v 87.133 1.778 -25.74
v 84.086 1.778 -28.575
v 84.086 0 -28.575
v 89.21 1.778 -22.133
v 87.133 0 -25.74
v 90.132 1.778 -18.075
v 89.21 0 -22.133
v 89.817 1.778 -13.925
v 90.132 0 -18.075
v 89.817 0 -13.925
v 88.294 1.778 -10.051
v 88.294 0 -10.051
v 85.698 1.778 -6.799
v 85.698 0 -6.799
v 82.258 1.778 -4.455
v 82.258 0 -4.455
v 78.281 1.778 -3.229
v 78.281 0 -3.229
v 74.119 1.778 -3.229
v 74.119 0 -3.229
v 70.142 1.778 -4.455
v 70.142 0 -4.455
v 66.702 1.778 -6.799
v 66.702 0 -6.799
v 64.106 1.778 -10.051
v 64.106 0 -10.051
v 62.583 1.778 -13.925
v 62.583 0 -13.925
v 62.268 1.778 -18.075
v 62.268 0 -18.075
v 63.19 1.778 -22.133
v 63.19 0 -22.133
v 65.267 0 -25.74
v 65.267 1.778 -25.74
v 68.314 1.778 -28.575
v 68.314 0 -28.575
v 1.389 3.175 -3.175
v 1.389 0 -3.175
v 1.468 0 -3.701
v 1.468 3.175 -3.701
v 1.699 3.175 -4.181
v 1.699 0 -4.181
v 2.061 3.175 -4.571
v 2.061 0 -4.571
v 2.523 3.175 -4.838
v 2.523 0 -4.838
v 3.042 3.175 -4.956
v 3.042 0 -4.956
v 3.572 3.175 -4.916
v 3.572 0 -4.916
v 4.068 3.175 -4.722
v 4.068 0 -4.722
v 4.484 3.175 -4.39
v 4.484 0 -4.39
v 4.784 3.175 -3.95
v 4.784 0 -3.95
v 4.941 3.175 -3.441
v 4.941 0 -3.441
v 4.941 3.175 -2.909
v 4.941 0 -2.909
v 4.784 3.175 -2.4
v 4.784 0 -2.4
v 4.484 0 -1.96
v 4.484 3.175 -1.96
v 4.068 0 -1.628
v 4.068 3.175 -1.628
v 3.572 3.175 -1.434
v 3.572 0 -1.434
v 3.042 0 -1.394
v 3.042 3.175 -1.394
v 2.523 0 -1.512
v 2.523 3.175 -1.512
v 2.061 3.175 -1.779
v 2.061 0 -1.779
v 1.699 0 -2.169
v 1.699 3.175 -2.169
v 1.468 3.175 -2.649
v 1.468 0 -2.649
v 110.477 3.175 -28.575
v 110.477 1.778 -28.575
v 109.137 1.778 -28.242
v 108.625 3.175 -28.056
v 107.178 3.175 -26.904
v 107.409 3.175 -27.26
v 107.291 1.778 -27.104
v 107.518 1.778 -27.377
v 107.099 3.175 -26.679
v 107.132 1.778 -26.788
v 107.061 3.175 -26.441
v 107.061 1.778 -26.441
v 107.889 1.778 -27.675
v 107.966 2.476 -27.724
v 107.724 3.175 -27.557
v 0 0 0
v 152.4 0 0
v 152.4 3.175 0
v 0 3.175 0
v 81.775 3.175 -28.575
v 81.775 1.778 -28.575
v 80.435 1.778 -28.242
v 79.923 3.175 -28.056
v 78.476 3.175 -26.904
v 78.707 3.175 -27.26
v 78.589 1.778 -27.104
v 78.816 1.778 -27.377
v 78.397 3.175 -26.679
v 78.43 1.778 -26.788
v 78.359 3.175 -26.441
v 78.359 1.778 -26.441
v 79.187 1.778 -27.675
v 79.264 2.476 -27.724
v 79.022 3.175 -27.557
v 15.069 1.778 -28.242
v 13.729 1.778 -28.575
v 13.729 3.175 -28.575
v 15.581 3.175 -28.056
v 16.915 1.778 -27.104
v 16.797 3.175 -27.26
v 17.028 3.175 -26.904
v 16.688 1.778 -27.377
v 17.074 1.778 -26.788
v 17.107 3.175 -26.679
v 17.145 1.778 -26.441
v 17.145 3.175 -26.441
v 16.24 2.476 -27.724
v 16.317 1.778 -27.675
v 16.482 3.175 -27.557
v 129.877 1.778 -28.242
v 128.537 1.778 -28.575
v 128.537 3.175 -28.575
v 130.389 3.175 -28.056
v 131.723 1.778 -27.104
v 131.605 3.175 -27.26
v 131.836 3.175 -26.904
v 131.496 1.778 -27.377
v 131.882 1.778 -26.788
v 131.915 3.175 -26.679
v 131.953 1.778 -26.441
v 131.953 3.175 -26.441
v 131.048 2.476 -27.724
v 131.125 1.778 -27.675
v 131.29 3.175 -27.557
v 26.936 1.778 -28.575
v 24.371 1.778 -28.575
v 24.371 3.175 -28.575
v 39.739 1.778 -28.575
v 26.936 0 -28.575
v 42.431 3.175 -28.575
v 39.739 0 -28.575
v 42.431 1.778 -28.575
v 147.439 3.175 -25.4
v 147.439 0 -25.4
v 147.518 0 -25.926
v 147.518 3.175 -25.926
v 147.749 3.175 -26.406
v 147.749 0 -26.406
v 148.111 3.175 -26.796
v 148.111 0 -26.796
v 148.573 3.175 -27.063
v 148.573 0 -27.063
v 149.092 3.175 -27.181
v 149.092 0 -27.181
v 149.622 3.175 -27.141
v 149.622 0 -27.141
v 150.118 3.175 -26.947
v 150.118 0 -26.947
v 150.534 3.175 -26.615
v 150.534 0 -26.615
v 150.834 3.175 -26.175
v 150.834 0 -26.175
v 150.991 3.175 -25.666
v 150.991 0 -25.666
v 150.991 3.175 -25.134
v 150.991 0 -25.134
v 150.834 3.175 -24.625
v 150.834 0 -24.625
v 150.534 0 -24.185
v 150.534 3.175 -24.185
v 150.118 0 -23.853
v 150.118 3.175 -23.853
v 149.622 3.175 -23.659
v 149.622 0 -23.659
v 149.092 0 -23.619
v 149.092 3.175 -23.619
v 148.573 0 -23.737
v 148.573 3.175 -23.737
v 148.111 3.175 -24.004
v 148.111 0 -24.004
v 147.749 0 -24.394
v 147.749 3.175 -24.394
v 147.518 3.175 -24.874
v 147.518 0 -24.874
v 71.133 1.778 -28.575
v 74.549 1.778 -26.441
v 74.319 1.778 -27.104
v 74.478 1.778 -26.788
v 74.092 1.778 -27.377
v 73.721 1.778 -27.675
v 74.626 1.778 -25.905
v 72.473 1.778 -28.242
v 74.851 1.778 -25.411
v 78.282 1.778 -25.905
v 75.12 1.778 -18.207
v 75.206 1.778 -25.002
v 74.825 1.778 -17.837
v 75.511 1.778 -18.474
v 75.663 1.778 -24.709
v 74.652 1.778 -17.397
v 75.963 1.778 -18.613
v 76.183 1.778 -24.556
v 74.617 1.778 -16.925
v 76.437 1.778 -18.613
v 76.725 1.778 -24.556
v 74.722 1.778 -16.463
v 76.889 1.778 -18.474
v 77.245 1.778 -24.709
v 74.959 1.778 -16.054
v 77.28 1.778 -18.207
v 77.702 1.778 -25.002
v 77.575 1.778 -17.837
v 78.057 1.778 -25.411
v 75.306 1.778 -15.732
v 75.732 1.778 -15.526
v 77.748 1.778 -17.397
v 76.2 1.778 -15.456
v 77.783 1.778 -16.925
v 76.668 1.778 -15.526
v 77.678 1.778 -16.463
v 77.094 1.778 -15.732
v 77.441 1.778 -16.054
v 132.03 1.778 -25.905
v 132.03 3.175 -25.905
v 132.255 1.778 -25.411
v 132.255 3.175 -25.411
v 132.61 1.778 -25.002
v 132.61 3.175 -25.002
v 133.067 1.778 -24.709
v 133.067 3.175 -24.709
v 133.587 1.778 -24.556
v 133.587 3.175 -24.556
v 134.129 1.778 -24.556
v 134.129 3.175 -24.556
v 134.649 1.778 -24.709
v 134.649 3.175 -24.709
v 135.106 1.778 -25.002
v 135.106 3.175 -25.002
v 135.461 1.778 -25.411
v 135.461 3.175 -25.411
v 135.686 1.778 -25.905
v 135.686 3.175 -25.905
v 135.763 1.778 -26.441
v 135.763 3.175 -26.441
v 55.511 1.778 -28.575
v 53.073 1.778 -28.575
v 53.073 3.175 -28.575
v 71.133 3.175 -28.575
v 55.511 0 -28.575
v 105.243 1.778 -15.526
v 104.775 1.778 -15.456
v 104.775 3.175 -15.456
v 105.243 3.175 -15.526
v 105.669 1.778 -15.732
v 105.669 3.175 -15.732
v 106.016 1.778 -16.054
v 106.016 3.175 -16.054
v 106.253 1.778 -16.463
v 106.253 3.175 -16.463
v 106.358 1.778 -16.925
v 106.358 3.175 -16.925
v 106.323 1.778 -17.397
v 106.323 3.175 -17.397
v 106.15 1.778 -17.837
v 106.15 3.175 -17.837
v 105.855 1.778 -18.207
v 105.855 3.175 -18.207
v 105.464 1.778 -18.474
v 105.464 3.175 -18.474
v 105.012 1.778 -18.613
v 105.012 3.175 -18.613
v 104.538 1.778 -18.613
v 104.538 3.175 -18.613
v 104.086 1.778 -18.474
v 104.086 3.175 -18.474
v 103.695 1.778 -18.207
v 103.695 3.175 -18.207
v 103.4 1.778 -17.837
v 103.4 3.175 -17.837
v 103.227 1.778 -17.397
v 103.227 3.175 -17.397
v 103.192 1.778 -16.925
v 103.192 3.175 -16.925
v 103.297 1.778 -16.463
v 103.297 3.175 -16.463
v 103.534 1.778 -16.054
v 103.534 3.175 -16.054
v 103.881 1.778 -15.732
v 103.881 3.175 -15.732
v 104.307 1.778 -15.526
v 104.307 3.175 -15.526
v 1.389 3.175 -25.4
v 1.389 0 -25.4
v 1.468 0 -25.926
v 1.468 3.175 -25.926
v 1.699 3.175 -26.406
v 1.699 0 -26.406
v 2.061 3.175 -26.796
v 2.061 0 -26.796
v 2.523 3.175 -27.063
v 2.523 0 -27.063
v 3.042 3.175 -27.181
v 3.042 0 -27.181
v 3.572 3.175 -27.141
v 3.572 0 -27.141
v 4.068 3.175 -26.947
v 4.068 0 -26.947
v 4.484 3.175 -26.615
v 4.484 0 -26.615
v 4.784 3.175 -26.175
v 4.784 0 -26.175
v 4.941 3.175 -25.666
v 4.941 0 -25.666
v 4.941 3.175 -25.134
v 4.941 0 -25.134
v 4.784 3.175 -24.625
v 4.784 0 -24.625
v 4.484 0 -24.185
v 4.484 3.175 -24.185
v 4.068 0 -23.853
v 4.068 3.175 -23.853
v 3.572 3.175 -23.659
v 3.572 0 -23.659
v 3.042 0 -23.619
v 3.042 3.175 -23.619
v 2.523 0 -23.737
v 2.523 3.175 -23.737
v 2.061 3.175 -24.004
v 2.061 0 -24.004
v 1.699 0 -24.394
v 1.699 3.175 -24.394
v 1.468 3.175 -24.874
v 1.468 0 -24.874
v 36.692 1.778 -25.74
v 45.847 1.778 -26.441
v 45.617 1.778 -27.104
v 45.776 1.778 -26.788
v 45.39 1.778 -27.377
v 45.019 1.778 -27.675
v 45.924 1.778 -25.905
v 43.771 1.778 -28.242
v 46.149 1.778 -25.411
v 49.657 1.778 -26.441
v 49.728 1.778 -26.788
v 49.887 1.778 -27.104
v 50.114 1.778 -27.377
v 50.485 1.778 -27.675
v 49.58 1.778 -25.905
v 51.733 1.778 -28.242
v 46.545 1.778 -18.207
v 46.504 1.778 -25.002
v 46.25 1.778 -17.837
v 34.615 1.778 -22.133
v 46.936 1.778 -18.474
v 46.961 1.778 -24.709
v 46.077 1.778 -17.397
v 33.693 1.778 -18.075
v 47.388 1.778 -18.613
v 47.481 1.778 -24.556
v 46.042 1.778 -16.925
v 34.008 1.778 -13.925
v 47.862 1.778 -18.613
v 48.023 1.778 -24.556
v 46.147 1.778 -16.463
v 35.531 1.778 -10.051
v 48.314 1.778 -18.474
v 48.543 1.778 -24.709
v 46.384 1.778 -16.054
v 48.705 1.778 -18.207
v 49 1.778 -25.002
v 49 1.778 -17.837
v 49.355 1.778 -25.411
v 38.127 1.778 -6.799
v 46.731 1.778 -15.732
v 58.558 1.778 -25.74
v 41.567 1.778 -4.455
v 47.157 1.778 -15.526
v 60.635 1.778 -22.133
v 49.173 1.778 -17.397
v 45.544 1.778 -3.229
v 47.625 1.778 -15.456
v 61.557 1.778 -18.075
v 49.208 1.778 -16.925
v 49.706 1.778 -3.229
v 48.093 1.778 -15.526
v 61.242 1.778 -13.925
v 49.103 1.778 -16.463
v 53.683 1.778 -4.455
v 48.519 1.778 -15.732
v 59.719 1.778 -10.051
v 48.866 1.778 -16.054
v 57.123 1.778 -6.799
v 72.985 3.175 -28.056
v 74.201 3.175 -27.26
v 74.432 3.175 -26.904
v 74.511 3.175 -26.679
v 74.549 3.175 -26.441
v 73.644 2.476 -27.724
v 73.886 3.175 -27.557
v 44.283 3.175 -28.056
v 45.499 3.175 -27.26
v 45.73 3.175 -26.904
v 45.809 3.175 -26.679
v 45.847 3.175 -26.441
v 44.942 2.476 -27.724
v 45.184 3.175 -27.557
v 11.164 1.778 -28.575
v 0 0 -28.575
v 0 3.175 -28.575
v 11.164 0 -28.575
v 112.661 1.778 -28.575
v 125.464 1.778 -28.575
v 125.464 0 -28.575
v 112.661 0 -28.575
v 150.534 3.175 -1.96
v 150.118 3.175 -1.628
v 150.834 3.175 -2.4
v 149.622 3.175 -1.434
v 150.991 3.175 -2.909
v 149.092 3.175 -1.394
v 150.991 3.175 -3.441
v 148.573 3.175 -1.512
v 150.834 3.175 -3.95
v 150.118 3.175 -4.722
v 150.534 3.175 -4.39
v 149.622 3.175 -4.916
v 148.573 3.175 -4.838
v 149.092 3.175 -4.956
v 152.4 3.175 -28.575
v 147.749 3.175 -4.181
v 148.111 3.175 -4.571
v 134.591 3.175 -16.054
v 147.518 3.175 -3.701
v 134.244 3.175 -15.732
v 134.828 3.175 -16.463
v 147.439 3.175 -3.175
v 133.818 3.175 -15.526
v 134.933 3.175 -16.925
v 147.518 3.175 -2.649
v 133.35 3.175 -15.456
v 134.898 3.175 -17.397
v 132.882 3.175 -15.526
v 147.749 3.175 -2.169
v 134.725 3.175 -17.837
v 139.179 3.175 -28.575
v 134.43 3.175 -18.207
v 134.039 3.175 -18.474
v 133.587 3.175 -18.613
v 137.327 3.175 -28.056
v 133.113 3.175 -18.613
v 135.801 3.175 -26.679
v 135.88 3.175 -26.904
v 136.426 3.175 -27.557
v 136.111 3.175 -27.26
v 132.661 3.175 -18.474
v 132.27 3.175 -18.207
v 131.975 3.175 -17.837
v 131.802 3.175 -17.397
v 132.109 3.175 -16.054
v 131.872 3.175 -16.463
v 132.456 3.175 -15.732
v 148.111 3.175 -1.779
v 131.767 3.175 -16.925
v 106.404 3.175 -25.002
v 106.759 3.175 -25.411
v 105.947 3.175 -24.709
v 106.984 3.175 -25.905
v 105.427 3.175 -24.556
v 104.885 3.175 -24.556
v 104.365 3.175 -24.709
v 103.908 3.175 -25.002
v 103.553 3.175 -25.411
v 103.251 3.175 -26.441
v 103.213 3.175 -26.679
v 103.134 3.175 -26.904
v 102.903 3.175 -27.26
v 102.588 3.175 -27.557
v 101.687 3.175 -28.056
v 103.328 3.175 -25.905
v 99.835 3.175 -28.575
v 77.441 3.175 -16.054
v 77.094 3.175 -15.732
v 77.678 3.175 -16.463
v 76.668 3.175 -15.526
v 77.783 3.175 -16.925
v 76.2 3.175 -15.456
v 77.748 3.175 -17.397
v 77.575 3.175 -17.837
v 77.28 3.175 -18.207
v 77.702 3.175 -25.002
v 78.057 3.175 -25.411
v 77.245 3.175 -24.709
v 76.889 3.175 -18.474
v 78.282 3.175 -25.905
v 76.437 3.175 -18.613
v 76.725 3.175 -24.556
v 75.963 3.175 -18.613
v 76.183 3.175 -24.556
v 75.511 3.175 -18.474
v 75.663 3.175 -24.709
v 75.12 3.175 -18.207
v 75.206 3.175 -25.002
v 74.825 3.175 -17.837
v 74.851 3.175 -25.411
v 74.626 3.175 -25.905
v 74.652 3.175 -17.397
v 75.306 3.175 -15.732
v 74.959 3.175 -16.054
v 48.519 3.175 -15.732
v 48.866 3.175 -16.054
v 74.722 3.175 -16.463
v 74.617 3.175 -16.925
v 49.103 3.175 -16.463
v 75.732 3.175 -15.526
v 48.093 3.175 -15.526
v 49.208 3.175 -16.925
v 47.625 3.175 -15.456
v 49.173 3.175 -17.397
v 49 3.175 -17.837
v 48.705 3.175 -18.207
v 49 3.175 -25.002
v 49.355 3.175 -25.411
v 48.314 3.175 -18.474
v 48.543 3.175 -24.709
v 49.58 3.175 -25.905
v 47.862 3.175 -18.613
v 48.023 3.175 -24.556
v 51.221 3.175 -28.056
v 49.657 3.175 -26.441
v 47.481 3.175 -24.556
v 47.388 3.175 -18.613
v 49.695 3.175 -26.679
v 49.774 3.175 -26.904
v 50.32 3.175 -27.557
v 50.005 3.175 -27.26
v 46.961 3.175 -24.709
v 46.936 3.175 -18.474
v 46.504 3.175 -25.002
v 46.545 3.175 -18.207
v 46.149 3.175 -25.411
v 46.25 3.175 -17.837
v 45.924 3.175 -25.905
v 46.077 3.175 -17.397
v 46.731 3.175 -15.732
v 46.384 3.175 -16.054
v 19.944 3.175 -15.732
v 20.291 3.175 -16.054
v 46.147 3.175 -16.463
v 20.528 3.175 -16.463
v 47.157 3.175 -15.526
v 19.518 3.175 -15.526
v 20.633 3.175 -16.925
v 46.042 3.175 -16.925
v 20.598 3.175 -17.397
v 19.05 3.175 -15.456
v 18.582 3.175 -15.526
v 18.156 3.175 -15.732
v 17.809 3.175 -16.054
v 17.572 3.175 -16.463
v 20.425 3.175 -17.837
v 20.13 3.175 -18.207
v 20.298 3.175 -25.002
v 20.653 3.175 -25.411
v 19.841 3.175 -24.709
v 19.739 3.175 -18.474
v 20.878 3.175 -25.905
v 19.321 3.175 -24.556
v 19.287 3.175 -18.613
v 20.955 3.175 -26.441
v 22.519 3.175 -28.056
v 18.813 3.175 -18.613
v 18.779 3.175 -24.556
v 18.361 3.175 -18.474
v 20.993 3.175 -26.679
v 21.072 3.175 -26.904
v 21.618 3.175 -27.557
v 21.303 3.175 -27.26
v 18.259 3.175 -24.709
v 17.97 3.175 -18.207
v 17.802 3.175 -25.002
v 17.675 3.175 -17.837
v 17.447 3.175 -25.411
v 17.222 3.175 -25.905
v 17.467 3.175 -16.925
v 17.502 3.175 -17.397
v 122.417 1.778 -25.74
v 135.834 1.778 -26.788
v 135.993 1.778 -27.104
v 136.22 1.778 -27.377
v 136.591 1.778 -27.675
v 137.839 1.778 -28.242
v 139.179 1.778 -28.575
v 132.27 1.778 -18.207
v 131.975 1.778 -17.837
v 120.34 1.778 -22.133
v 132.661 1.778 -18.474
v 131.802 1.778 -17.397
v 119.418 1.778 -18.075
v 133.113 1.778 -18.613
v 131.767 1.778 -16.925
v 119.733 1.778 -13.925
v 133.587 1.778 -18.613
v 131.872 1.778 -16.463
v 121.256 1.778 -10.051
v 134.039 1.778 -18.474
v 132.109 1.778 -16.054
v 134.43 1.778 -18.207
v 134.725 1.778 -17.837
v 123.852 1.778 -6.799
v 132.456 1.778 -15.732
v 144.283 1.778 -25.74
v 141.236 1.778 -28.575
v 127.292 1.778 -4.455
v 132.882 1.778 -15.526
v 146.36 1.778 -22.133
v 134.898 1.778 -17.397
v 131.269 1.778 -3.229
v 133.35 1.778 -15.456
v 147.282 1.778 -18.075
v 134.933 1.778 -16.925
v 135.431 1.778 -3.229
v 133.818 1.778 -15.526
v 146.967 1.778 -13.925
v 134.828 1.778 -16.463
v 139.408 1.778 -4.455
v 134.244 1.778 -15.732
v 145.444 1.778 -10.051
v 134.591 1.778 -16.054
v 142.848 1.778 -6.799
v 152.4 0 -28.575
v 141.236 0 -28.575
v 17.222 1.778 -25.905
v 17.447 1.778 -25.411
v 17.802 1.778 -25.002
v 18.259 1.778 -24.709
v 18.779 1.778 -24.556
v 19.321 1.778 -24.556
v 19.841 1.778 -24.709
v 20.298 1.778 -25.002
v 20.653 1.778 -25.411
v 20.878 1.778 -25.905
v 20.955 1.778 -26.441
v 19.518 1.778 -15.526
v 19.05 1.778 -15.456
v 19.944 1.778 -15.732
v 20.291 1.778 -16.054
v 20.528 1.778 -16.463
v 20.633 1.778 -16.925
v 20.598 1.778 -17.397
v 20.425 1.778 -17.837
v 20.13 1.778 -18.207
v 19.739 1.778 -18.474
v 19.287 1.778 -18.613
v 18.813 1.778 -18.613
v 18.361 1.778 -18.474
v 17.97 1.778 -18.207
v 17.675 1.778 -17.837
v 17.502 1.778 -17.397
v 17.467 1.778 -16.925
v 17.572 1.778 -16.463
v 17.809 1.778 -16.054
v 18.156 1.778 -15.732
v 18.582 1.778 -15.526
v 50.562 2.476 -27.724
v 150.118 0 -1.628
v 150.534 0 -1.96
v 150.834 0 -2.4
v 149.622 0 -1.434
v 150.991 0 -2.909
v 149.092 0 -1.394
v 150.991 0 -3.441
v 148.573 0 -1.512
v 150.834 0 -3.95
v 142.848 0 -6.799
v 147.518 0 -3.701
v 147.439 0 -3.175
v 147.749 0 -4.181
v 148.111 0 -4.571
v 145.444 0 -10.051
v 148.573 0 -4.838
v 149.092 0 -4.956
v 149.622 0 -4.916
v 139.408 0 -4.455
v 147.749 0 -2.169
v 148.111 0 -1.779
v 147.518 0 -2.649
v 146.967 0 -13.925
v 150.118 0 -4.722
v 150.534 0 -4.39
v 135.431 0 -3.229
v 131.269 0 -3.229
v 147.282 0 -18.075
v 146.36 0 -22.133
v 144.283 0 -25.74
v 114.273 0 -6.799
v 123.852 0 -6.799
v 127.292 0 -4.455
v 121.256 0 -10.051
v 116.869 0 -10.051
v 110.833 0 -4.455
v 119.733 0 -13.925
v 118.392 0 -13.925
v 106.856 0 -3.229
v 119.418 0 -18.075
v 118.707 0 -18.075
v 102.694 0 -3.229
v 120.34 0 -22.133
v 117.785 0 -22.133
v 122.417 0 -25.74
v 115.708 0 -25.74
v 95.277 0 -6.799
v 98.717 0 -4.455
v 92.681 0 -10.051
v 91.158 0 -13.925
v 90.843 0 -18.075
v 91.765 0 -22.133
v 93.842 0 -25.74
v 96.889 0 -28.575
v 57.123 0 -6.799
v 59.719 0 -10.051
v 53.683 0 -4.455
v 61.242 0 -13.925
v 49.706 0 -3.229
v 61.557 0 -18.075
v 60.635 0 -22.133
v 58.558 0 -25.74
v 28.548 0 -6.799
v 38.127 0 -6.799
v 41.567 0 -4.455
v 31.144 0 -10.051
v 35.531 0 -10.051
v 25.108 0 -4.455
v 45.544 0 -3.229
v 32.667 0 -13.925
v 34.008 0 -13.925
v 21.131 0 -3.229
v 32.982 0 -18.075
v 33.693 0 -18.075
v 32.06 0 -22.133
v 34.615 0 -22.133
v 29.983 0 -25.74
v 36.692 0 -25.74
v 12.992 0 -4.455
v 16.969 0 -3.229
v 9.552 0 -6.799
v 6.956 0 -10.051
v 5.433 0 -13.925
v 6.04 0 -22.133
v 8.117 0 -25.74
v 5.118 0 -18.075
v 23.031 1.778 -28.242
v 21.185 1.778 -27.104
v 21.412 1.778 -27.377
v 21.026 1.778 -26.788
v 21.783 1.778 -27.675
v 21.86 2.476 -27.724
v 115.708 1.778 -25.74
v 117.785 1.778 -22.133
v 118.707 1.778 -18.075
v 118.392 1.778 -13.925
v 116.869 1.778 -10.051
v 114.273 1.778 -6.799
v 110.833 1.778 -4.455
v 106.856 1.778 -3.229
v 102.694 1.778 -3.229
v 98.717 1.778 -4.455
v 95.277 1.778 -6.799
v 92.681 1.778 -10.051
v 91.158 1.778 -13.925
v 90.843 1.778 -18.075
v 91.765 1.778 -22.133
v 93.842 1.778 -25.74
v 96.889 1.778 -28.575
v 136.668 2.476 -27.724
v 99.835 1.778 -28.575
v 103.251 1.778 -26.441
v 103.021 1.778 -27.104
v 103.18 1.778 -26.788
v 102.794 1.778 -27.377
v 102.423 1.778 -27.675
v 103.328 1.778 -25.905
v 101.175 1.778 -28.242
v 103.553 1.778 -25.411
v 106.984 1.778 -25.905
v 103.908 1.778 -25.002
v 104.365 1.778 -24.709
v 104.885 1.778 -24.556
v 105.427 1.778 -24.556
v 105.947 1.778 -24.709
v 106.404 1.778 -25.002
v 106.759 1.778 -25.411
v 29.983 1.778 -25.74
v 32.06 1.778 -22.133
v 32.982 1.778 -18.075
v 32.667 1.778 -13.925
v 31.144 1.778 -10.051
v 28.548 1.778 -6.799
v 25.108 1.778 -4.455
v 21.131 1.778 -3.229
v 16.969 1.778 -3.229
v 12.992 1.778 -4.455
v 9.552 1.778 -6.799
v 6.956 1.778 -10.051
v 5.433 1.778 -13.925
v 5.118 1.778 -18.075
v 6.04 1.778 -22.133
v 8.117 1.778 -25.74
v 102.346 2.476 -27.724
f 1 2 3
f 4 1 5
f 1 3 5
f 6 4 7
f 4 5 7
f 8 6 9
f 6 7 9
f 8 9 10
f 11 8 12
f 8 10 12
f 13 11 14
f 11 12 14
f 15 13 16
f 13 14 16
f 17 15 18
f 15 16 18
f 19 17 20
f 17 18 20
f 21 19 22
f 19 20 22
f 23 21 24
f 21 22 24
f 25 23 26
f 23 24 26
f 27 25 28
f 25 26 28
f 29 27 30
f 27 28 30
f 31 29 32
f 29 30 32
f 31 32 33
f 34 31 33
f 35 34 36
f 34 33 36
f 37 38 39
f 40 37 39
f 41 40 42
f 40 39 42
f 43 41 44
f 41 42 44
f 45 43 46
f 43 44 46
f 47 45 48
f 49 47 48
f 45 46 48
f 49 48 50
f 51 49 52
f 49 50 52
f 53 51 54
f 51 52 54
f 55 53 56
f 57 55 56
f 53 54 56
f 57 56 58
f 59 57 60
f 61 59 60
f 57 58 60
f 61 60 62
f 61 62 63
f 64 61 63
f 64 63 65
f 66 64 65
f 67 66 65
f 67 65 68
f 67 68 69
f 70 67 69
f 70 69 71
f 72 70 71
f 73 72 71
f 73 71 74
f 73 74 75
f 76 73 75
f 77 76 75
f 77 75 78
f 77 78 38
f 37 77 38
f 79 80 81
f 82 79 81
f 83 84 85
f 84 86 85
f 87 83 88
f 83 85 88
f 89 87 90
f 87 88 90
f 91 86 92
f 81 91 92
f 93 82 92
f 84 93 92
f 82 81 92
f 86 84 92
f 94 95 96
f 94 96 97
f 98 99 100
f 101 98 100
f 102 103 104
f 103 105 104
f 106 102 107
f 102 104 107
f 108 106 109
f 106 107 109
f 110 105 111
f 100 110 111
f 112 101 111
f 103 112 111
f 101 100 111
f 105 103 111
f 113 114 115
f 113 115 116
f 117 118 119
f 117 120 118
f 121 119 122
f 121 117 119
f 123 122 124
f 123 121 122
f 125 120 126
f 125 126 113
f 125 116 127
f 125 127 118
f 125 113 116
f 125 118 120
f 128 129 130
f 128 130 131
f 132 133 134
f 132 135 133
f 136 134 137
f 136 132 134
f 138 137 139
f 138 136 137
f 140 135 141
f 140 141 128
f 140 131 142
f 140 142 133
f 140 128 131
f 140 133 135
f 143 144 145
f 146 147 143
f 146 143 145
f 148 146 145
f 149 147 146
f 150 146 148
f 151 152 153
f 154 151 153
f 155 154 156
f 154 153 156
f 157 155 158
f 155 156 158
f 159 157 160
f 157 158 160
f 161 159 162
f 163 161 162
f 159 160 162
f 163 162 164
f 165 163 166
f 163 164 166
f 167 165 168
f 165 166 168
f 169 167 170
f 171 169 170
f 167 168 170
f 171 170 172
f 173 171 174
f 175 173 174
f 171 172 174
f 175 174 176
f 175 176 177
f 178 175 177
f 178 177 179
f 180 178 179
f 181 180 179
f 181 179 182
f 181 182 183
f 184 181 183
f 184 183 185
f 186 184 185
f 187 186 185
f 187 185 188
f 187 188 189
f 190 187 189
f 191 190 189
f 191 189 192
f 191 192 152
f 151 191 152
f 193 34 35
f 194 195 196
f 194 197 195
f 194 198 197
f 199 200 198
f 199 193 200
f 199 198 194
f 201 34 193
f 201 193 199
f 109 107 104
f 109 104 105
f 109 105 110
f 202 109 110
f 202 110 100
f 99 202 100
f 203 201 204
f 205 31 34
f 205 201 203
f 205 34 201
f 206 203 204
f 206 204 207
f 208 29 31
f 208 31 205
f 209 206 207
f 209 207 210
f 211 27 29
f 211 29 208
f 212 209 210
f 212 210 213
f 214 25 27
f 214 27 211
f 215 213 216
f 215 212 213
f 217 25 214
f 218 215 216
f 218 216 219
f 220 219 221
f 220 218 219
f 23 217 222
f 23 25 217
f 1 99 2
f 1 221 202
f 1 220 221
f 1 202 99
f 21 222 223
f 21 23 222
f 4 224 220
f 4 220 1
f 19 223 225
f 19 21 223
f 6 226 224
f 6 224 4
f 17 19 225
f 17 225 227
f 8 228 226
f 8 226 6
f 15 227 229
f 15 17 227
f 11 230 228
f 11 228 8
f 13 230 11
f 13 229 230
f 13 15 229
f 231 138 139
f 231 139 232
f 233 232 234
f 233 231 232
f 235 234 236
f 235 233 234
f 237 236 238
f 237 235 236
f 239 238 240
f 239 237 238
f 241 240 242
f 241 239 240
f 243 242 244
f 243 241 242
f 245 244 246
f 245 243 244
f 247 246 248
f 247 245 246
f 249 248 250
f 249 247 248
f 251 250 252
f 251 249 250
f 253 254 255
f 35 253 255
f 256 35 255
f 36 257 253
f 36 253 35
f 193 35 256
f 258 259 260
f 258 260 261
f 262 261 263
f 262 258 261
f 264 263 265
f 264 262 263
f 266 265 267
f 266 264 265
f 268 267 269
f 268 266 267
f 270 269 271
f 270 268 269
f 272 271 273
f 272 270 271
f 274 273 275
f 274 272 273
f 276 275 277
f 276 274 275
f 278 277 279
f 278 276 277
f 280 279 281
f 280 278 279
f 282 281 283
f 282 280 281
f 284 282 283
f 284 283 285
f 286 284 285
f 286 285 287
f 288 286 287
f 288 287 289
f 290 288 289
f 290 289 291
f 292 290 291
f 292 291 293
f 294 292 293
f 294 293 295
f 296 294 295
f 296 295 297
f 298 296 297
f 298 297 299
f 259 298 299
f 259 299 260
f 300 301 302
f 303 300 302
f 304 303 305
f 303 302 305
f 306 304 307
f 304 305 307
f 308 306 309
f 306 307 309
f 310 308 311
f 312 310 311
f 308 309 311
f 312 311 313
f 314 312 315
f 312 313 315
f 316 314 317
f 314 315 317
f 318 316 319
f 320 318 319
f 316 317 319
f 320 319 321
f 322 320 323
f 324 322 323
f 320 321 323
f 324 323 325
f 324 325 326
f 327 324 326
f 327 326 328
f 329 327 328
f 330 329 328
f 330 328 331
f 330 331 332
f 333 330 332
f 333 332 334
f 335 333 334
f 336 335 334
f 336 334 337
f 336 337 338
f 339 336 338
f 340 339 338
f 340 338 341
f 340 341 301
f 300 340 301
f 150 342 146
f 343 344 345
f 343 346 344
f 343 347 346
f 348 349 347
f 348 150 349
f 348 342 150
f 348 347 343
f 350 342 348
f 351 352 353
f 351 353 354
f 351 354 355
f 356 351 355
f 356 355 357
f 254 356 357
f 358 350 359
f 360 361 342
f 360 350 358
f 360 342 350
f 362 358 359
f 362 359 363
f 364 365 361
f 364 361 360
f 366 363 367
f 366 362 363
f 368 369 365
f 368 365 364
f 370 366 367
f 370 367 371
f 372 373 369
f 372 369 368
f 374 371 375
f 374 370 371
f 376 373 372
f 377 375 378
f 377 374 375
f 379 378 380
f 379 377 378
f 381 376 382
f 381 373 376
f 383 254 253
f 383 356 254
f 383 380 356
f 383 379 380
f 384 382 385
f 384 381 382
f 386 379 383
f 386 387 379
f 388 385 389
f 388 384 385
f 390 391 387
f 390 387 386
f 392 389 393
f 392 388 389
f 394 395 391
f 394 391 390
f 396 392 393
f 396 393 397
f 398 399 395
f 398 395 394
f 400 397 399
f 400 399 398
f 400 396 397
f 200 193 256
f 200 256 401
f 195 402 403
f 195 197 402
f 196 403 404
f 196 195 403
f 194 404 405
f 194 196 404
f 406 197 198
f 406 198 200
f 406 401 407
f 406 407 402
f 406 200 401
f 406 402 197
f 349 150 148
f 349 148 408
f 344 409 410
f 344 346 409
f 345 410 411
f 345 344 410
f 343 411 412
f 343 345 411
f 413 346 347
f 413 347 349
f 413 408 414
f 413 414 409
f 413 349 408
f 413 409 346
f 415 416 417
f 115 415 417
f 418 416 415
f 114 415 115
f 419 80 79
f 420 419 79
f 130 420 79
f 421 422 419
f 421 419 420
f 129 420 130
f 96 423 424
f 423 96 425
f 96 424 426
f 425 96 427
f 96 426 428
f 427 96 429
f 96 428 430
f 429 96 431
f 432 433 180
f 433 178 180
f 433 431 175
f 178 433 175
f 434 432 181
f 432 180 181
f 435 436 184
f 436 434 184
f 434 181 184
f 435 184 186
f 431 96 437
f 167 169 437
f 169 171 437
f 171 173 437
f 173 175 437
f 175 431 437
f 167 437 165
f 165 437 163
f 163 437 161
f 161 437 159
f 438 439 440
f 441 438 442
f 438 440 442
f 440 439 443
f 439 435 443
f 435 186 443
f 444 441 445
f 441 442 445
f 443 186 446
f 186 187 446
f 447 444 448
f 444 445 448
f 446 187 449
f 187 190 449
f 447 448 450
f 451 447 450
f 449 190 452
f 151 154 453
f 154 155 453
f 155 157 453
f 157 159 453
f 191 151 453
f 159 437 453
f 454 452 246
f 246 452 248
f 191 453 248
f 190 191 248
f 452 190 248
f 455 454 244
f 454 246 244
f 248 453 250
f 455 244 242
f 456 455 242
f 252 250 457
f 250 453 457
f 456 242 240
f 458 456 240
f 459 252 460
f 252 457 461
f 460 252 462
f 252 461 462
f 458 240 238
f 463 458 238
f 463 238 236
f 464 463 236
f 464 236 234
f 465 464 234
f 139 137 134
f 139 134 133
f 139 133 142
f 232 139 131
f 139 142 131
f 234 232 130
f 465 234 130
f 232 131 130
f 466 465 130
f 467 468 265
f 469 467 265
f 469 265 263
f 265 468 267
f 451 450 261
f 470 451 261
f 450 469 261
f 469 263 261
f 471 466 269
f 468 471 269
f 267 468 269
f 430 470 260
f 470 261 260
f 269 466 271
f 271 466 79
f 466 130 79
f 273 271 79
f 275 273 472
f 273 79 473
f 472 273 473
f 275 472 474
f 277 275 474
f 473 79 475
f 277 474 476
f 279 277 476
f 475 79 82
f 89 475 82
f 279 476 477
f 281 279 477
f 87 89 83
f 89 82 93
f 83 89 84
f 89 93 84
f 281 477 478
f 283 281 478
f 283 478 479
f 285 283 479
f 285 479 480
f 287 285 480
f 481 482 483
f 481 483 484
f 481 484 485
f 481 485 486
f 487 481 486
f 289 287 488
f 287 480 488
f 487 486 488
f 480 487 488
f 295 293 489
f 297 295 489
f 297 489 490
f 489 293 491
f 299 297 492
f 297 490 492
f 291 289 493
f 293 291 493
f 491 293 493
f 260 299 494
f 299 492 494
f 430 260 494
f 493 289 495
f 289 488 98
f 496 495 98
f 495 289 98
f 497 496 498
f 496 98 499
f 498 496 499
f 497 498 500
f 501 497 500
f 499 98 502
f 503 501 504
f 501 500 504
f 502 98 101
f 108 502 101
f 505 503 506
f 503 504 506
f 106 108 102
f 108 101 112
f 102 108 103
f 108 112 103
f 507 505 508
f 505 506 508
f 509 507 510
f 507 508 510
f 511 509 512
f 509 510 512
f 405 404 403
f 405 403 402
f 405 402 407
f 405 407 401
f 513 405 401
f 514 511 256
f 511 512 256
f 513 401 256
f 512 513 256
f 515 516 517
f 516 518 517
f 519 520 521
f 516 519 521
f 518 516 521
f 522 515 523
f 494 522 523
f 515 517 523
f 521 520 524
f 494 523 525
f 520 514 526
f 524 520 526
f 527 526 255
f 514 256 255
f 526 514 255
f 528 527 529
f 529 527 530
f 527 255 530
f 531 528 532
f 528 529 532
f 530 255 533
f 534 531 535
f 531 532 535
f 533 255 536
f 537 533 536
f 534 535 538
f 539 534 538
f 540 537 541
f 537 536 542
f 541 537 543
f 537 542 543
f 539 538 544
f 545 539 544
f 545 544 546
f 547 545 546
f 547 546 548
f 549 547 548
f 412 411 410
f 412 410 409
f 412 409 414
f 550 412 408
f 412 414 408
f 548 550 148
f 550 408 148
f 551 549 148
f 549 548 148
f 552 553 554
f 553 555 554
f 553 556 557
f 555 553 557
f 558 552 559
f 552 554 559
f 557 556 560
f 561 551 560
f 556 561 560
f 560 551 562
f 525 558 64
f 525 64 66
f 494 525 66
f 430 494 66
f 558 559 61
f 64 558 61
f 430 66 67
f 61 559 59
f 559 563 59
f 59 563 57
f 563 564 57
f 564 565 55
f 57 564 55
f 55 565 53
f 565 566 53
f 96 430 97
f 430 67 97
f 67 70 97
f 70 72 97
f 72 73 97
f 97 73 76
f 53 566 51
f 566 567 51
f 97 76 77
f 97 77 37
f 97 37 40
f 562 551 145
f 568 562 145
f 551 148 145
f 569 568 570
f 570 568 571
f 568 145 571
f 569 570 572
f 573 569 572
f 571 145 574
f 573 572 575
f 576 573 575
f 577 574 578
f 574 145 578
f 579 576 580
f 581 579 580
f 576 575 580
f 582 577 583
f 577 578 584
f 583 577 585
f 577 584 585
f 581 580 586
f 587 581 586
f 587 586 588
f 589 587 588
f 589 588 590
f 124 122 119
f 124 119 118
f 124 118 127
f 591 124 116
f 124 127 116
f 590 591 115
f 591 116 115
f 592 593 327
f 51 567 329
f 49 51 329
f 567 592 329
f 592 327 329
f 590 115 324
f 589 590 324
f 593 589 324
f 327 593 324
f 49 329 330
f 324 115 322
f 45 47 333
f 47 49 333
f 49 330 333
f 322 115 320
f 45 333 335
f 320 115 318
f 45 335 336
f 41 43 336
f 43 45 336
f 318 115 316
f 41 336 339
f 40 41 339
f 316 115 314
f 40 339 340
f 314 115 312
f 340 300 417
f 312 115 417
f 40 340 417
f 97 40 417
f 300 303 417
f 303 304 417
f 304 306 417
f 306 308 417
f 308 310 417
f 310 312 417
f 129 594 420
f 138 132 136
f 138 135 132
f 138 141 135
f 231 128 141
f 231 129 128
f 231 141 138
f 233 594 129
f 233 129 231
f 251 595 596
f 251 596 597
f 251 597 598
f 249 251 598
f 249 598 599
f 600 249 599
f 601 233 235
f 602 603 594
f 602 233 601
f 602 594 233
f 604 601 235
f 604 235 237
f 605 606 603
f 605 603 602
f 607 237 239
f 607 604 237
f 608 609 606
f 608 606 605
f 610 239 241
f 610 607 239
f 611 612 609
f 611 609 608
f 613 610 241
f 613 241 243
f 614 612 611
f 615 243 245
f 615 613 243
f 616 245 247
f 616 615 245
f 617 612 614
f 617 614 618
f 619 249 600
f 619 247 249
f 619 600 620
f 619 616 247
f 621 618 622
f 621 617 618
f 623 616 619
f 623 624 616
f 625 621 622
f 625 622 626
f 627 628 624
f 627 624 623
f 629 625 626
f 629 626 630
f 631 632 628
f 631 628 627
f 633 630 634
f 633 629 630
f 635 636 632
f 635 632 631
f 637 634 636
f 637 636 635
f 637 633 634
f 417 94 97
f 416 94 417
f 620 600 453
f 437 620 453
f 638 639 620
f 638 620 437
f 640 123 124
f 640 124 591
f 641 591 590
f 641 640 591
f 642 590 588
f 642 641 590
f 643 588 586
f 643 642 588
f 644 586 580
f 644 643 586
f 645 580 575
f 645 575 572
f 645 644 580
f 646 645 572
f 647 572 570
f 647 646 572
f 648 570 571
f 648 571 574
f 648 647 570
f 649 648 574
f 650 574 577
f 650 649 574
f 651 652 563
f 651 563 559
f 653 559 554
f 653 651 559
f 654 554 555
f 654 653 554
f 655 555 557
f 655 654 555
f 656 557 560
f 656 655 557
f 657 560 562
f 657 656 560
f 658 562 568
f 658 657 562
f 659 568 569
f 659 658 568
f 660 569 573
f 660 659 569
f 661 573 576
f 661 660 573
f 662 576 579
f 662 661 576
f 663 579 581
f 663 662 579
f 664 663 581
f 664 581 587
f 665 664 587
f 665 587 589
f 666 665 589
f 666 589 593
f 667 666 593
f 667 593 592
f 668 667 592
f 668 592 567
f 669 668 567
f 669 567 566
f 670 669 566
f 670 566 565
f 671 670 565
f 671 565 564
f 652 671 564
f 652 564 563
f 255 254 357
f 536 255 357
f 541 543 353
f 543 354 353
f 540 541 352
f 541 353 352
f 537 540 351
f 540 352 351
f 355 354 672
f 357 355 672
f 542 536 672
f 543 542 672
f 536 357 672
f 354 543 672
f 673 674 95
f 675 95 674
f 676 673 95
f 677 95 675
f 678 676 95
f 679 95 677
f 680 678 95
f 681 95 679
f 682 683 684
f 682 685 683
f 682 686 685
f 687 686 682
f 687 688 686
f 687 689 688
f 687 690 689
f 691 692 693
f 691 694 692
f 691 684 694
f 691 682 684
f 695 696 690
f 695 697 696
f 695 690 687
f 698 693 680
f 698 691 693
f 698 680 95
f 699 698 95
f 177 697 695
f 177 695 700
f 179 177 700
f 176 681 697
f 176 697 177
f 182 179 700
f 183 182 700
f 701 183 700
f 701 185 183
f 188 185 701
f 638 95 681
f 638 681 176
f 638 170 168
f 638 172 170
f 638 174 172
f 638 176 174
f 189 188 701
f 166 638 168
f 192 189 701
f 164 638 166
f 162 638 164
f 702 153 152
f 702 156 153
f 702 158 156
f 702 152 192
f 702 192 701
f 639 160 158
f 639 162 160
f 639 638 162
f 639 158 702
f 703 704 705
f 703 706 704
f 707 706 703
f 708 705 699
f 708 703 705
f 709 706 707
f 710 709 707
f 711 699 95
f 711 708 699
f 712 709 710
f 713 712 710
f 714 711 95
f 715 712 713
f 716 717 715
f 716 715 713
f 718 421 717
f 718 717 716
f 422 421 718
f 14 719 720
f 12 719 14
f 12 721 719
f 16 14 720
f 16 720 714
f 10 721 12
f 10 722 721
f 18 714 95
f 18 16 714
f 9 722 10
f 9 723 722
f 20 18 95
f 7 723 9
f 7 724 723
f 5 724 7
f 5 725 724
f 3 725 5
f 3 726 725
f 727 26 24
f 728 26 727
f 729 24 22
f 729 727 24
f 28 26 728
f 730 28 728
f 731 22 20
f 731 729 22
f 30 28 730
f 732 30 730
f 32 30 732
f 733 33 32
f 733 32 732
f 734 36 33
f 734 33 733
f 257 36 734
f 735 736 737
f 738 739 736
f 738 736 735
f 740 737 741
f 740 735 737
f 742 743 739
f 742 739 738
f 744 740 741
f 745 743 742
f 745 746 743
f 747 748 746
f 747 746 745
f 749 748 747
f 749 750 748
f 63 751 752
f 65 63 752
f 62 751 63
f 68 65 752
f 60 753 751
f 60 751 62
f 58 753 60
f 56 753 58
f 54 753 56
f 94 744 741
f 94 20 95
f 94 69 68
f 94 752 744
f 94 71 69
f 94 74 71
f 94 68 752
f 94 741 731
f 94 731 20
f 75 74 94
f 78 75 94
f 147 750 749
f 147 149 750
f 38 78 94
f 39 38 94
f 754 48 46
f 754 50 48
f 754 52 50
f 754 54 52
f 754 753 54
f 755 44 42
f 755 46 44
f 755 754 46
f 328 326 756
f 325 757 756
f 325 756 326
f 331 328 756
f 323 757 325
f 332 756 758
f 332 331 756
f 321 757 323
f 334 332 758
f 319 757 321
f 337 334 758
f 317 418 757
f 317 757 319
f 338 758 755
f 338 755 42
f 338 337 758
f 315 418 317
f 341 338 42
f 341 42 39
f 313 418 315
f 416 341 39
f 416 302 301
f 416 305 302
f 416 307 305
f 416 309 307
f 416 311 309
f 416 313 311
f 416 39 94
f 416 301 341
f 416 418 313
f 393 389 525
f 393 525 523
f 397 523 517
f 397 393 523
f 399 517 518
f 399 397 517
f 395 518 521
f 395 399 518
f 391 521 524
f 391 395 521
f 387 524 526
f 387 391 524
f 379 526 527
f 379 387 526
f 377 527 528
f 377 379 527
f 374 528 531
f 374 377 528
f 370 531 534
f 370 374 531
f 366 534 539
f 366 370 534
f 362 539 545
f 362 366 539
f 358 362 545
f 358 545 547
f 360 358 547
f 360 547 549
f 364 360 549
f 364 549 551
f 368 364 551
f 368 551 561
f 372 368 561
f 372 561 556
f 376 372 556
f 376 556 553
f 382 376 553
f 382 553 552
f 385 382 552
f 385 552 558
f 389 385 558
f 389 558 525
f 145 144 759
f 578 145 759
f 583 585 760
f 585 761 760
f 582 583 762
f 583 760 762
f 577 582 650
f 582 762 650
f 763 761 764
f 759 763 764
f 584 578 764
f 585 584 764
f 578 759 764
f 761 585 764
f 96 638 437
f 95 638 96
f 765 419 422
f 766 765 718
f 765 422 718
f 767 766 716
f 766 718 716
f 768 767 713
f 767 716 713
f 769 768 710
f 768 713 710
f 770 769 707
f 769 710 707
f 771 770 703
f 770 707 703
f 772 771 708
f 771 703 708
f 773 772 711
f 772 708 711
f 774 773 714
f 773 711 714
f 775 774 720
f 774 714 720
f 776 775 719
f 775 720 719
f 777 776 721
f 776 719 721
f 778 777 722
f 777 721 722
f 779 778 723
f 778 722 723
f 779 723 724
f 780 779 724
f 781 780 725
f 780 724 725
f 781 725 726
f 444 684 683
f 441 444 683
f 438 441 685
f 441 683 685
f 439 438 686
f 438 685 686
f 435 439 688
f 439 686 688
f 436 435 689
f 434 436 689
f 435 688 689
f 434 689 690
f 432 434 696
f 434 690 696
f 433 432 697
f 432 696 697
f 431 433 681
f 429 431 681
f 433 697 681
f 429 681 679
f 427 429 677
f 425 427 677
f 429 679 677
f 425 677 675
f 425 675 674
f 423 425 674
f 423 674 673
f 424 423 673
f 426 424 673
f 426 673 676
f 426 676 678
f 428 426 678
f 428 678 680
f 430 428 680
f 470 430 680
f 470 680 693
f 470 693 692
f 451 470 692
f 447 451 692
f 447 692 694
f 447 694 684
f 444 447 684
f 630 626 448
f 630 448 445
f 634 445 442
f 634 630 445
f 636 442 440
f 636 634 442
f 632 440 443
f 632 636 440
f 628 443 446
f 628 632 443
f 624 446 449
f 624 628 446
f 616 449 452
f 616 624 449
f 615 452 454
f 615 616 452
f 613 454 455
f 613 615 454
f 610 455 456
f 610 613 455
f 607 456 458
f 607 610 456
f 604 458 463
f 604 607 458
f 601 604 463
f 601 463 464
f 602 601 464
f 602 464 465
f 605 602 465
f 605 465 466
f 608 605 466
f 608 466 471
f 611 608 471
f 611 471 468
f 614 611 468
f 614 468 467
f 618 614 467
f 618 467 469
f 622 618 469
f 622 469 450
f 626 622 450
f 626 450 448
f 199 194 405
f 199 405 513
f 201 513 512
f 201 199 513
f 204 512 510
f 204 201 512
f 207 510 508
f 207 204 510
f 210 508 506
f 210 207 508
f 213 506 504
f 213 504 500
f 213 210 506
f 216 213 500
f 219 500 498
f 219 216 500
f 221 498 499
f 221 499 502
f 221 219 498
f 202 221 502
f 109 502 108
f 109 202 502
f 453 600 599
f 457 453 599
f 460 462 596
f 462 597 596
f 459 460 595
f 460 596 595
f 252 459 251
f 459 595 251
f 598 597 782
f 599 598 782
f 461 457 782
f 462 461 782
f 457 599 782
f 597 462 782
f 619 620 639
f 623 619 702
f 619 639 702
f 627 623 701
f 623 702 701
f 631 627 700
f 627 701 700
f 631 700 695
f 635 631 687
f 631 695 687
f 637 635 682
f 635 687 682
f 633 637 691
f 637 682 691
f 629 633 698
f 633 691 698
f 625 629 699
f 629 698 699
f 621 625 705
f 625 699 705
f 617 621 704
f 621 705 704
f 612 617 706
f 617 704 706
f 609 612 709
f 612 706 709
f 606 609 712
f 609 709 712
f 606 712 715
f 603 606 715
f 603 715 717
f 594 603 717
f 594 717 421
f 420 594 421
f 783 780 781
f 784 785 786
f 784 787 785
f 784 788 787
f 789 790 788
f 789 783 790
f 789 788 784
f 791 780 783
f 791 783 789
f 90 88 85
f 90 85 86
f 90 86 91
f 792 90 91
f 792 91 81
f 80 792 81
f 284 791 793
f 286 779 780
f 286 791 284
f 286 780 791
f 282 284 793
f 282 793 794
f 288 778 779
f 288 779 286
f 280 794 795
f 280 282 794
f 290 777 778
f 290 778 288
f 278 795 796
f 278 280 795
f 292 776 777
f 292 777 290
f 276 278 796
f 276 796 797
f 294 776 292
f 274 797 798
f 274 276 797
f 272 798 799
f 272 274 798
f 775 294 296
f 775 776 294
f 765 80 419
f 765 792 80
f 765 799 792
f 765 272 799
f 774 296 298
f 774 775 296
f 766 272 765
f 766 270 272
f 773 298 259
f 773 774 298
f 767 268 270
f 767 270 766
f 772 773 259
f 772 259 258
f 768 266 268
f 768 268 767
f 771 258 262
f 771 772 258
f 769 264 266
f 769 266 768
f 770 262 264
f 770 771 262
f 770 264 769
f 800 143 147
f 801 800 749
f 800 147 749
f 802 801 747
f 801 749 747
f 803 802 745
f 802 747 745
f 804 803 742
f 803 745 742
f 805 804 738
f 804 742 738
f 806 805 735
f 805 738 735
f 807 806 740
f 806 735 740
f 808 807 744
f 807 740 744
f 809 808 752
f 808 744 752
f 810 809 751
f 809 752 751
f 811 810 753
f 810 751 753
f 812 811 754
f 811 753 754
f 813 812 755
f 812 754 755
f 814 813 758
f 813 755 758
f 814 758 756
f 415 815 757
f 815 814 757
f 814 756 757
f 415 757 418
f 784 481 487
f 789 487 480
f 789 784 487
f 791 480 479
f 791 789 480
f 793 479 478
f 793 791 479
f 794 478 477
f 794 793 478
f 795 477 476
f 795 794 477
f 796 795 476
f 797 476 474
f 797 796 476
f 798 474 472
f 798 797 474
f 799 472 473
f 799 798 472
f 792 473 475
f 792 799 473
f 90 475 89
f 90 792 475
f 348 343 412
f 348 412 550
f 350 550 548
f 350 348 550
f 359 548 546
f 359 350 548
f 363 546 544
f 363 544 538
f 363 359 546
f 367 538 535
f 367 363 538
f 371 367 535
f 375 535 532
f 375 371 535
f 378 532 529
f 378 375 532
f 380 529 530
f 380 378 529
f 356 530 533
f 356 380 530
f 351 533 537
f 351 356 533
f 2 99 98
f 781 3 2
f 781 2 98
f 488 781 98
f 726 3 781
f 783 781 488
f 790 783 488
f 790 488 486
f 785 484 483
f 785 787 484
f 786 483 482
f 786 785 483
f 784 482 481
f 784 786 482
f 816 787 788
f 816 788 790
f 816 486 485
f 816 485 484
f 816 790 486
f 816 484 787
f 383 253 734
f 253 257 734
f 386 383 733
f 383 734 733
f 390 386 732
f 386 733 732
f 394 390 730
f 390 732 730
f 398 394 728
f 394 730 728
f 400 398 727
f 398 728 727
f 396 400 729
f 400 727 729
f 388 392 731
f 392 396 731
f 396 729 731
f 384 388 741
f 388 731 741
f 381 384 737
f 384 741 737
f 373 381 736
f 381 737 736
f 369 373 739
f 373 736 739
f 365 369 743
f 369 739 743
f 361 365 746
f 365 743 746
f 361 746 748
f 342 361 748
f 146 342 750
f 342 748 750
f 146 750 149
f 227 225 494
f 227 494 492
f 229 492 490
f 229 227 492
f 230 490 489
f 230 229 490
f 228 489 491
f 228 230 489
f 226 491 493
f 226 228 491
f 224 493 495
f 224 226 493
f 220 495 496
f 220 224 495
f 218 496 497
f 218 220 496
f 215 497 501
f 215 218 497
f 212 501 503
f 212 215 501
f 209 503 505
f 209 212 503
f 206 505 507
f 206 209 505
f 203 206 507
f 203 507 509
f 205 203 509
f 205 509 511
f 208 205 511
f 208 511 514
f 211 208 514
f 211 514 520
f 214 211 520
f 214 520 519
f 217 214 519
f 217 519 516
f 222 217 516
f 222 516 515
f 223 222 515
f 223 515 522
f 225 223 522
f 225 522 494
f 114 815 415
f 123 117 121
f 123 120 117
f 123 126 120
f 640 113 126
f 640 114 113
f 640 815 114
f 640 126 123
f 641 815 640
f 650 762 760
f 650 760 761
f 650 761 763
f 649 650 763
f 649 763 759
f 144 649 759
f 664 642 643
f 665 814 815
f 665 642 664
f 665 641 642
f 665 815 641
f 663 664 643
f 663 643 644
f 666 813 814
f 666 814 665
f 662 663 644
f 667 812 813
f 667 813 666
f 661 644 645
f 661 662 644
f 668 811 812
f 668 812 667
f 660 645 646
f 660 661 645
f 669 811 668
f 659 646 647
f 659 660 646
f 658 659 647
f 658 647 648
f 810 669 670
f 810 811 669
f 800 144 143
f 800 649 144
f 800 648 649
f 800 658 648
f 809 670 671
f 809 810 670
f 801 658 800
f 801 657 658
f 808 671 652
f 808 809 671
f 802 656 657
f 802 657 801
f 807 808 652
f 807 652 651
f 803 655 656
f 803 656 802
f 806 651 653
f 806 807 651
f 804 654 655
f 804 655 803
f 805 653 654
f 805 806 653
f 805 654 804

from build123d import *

# Parameters (mm, degrees)
SKETCH1_R                       = 1.5875
BOSS_EXTRUDE1_DEPTH             = 3.175
SKETCH2_R                       = 13.97
CUT_EXTRUDE1_DEPTH              = 1.778
F_9_64_0_14063_DIAMETER_HOLE1_D = 3.572002


with BuildPart() as part:
    # Sketch1 → Boss-Extrude1 (new body)
    with BuildSketch(Plane(origin=(0, 0, 0), x_dir=(1, 0, 0), z_dir=(0, 1, 0))):
        with BuildLine():
            Line((139.17898319, 28.575), (152.4, 28.575))
            Line((152.4, 28.575), (152.4, 0))
            Line((152.4, 0), (0, 0))
            Line((0, 0), (0, 28.575))
            Line((0, 28.575), (13.72901681, 28.575))
            add(Edge.make_bspline(
                [(13.72901681, 28.575), (17.042474439, 27.940707838), (17.145, 26.4414)],
                knots=[0, 0, 0, 0.606076244, 0.606076244, 0.606076244], degree=2))
            ThreePointArc((17.145, 26.4414), (19.05, 24.5364), (20.955, 26.4414))
            add(Edge.make_bspline(
                [(24.37098319, 28.575), (21.057525561, 27.940707838), (20.955, 26.4414)],
                knots=[0, 0, 0, 0.606076244, 0.606076244, 0.606076244], degree=2))
            Line((24.37098319, 28.575), (42.43101681, 28.575))
            add(Edge.make_bspline(
                [(42.43101681, 28.575), (45.744474439, 27.940707838), (45.847, 26.4414)],
                knots=[0, 0, 0, 0.606076244, 0.606076244, 0.606076244], degree=2))
            ThreePointArc((45.847, 26.4414), (47.752, 24.5364), (49.657, 26.4414))
            add(Edge.make_bspline(
                [(53.07298319, 28.575), (49.759525561, 27.940707838), (49.657, 26.4414)],
                knots=[0, 0, 0, 0.606076244, 0.606076244, 0.606076244], degree=2))
            Line((53.07298319, 28.575), (71.13301681, 28.575))
            add(Edge.make_bspline(
                [(71.13301681, 28.575), (74.446474439, 27.940707838), (74.549, 26.4414)],
                knots=[0, 0, 0, 0.606076244, 0.606076244, 0.606076244], degree=2))
            ThreePointArc((74.549, 26.4414), (76.454, 24.5364), (78.359, 26.4414))
            add(Edge.make_bspline(
                [(81.77498319, 28.575), (78.461525561, 27.940707838), (78.359, 26.4414)],
                knots=[0, 0, 0, 0.606076244, 0.606076244, 0.606076244], degree=2))
            Line((81.77498319, 28.575), (99.83501681, 28.575))
            add(Edge.make_bspline(
                [(99.83501681, 28.575), (103.148474439, 27.940707838), (103.251, 26.4414)],
                knots=[0, 0, 0, 0.606076244, 0.606076244, 0.606076244], degree=2))
            ThreePointArc((103.251, 26.4414), (105.156, 24.5364), (107.061, 26.4414))
            add(Edge.make_bspline(
                [(110.47698319, 28.575), (107.163525561, 27.940707838), (107.061, 26.4414)],
                knots=[0, 0, 0, 0.606076244, 0.606076244, 0.606076244], degree=2))
            Line((110.47698319, 28.575), (128.53701681, 28.575))
            add(Edge.make_bspline(
                [(128.53701681, 28.575), (131.850474439, 27.940707838), (131.953, 26.4414)],
                knots=[0, 0, 0, 0.606076244, 0.606076244, 0.606076244], degree=2))
            ThreePointArc((131.953, 26.4414), (133.858, 24.5364), (135.763, 26.4414))
            add(Edge.make_bspline(
                [(139.17898319, 28.575), (135.865525561, 27.940707838), (135.763, 26.4414)],
                knots=[0, 0, 0, 0.606076244, 0.606076244, 0.606076244], degree=2))
        make_face()
        with Locations(Location((19.05, 17.0434, 0), (0, 0, 270))):
            Circle(SKETCH1_R, mode=Mode.SUBTRACT)
        with Locations(Location((47.625, 17.0434, 0), (0, 0, 270))):
            Circle(SKETCH1_R, mode=Mode.SUBTRACT)
        with Locations(Location((76.2, 17.0434, 0), (0, 0, 270))):
            Circle(SKETCH1_R, mode=Mode.SUBTRACT)
        with Locations(Location((104.775, 17.0434, 0), (0, 0, 270))):
            Circle(SKETCH1_R, mode=Mode.SUBTRACT)
        with Locations(Location((133.35, 17.0434, 0), (0, 0, 270))):
            Circle(SKETCH1_R, mode=Mode.SUBTRACT)
    extrude(amount=BOSS_EXTRUDE1_DEPTH)

    # Sketch2 → Cut-Extrude1 (cut)
    with BuildSketch(Plane.XZ):
        with Locations((19.05, -17.0434)):
            Circle(SKETCH2_R)
        with Locations((47.625, -17.0434)):
            Circle(SKETCH2_R)
        with Locations((76.2, -17.0434)):
            Circle(SKETCH2_R)
        with Locations((104.775, -17.0434)):
            Circle(SKETCH2_R)
        with Locations((133.35, -17.0434)):
            Circle(SKETCH2_R)
    extrude(amount=-CUT_EXTRUDE1_DEPTH, mode=Mode.SUBTRACT)

    # 9/64 (0.14063) Diameter Hole1 (through all)
    with Locations(Plane(origin=(0, 3.175, 0), x_dir=(1, 0, 0), z_dir=(0, 1, 0))):
        with Locations((3.175, 25.4), (3.175, 3.175), (149.225, 3.175), (149.225, 25.4)):
            Hole(F_9_64_0_14063_DIAMETER_HOLE1_D / 2)


solid = part.part
